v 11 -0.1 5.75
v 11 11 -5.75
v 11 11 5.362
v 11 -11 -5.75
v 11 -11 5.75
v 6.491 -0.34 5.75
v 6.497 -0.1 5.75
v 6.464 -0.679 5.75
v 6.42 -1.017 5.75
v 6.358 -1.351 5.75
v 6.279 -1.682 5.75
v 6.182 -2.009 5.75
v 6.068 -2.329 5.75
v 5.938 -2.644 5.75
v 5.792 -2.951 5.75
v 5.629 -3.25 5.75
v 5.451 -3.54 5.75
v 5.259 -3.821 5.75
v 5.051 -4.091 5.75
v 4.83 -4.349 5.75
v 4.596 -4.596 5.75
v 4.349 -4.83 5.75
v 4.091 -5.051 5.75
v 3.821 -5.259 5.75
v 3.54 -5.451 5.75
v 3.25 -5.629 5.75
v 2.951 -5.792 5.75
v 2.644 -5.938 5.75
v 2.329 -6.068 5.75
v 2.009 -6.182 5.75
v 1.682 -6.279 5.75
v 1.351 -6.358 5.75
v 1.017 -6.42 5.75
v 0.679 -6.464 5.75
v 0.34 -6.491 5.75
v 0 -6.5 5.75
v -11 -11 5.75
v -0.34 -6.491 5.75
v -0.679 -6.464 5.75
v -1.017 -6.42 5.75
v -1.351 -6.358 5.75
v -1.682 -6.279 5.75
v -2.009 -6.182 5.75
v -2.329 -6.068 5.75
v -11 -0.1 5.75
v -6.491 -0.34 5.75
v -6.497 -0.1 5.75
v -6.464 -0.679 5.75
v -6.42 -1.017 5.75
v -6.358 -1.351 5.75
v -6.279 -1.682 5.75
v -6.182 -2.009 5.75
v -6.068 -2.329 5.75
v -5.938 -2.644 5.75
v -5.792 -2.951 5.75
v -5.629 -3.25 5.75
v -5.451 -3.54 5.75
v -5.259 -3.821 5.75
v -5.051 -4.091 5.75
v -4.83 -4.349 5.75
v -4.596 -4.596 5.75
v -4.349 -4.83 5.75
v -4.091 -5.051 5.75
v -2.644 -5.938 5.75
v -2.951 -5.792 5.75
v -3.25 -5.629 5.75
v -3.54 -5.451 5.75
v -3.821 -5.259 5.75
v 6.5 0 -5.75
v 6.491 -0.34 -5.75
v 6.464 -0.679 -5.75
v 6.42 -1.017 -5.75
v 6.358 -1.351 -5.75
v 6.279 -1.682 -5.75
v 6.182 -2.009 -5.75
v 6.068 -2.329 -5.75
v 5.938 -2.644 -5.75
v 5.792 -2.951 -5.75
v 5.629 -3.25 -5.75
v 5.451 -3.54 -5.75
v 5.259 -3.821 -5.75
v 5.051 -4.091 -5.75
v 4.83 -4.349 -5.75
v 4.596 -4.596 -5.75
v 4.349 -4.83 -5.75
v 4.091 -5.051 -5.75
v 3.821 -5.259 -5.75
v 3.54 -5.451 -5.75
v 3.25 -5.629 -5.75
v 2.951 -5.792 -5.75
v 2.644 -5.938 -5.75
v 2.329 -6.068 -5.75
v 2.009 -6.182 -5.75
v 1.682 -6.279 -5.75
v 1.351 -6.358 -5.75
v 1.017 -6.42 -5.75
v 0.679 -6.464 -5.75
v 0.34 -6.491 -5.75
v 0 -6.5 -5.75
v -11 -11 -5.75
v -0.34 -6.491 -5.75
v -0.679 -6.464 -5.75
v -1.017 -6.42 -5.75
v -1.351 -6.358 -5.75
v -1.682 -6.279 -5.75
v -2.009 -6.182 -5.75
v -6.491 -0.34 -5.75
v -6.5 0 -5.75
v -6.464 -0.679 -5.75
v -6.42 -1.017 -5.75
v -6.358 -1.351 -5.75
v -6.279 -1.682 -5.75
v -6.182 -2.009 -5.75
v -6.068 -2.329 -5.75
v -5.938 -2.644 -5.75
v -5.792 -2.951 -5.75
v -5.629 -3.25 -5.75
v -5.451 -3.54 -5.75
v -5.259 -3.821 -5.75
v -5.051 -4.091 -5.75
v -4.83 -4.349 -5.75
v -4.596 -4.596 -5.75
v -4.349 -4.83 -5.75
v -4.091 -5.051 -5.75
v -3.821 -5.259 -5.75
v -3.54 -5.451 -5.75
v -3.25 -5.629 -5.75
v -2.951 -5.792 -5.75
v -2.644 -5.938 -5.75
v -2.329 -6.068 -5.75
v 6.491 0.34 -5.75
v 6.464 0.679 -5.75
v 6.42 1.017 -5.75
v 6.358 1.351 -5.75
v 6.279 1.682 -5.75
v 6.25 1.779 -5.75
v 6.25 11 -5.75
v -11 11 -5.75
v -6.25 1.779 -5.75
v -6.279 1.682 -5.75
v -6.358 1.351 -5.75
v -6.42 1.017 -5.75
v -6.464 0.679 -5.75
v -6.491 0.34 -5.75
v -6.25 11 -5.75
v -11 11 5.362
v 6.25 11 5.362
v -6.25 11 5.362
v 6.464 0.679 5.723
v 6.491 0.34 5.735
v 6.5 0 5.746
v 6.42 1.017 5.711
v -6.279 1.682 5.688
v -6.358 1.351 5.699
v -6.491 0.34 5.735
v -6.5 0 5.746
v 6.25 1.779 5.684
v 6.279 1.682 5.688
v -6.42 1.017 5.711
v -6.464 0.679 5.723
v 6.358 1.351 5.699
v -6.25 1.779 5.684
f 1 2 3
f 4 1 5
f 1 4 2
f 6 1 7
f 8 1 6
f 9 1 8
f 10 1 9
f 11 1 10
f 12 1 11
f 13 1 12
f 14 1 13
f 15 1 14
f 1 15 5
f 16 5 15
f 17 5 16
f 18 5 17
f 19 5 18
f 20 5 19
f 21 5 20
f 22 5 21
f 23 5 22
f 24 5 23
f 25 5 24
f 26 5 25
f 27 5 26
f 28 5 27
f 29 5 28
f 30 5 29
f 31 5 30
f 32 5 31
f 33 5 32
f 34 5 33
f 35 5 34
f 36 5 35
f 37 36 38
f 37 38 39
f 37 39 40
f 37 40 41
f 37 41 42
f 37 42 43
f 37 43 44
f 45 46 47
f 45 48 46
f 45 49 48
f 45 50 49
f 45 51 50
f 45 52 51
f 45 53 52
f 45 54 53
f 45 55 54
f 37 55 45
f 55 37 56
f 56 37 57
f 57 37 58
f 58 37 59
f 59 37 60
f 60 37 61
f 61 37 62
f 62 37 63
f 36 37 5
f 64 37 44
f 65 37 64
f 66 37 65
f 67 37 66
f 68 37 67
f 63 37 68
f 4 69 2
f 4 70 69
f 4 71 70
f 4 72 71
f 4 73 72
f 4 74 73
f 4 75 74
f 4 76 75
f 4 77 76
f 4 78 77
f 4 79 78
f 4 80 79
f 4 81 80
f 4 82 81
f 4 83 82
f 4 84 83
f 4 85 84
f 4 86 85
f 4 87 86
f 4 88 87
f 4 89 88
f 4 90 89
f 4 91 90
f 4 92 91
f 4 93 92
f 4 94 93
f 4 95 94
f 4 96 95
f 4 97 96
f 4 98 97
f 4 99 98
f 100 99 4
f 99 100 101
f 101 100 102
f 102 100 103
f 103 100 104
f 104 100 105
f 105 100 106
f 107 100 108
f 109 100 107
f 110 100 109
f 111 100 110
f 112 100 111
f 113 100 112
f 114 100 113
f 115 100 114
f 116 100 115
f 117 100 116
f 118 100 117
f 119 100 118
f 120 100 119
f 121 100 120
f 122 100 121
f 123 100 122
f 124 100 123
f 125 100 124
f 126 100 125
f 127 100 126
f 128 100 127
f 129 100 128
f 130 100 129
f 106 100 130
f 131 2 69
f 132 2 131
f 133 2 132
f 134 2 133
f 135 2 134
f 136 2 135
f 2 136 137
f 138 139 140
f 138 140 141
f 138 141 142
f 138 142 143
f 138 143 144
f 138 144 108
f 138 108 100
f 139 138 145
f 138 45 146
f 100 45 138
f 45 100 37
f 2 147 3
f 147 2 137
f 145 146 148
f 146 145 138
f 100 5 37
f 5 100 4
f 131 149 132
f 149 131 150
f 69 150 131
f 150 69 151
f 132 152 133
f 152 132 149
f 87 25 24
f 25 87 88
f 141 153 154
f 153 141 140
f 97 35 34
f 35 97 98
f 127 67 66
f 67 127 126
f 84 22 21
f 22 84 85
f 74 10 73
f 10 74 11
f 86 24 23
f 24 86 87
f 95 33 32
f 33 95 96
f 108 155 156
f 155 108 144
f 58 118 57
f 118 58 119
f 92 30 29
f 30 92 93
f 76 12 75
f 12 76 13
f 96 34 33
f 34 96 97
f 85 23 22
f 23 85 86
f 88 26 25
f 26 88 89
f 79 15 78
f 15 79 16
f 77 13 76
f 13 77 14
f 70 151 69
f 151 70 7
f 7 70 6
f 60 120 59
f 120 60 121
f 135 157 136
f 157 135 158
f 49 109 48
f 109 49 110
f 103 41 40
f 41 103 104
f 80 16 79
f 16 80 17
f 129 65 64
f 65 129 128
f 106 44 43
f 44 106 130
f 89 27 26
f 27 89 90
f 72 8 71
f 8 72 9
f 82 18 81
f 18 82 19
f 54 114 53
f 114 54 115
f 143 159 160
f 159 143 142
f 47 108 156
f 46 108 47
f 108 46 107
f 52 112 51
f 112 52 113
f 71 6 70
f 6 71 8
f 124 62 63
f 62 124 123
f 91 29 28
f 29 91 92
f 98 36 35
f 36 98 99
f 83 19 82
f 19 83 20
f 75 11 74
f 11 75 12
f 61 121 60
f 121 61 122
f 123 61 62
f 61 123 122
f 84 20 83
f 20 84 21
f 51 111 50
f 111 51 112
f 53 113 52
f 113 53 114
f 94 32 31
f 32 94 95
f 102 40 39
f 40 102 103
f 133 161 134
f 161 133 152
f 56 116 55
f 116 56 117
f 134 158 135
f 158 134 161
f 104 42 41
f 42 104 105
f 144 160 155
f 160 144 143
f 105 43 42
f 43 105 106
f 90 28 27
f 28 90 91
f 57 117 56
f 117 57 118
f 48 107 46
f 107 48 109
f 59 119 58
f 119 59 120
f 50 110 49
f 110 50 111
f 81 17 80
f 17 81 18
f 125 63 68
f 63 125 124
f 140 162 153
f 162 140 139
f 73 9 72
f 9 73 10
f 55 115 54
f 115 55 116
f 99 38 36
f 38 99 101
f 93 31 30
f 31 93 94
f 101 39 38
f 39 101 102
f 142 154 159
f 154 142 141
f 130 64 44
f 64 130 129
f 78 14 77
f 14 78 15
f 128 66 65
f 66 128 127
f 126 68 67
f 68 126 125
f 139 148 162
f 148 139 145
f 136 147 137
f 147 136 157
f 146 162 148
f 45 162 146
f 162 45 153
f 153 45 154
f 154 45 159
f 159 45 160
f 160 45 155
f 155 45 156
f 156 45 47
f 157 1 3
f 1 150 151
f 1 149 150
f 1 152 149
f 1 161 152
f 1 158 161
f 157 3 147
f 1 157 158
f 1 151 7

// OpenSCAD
/*
  Wedge Volor Z axis's ACME leadscrew nut down into its slot.
  The leadscrew nut (machined from HDPE) and this wedge sit inside 1" square tubing with 0.050" walls.
  
*/
$fs=0.1;
$fa=3;

shaftOD=13;
slotID=22;
Z = 11.5; // Z height of wedge, should be very tight to reduce backlash


module volor_nut_wedge()
{
    difference() {
        // body
        cube([slotID,slotID,Z],center=true);
        
        // thru shaft
        cylinder(d=shaftOD,h=2*Z,center=true);
        
        // spring loaded slot for insertion
        hull() {
            for (y=[0,slotID]) translate([0,y,0])
                cylinder(d=shaftOD-0.5,h=2*Z,center=true);
        }
        
        // sloped insertion wedge
        translate([0,0,Z]) rotate([-2,0,0])
            cube([2*slotID,2*slotID,Z],center=true);
    }
}

volor_nut_wedge();
